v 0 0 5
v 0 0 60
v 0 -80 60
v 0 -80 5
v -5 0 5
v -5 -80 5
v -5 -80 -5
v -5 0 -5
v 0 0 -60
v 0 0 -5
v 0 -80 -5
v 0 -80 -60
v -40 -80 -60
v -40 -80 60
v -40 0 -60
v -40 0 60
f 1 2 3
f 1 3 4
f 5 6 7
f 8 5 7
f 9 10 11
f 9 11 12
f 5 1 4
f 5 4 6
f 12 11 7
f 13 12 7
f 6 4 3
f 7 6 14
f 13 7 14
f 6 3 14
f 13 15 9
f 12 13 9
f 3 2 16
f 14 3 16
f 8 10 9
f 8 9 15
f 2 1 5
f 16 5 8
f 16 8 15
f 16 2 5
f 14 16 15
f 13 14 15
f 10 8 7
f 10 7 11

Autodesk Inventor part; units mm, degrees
ref_plane "YZ Plane" through (0, 0, 0) normal (1, 0, 0) x (0, 1, 0)
ref_plane "XZ Plane" through (0, 0, 0) normal (0, 1, 0) x (-1, 0, 0)
ref_plane "XY Plane" through (0, 0, 0) normal (0, 0, 1) x (1, 0, 0)
sketch "Sketch1" plane through (0, 0, 0) normal (0, 1, 0) x (-1, 0, 0)
  line L0 (40, -60) -> (-40, -60)
  line L1 (-40, -60) -> (-40, 60)
  line L2 (-40, 60) -> (40, 60)
  line L3 (40, 60) -> (40, -60)
  line L4 (5, -5) -> (-5, -5)
  line L5 (-5, -5) -> (-5, 5)
  line L6 (-5, 5) -> (5, 5)
  line L7 (5, 5) -> (5, -5)
  point P0 (0, 0)
  point P1 (-5, 0)
  dimension "d1" = 120
  dimension "d2" = 80
  dimension "d3" = 10
  dimension "d4" = 10
  dimension "d5" = 5
  dimension "d6" = 5
  dimension "d7" = 40
  dimension "d8" = 60
extrude "Extrusion1" add sketch "Sketch1" against normal blind 80
sketch "Sketch5" plane through (40, 0, 60) normal (1, 0, 0) x (0, 0, -1)
  line L0 (120, 0) -> (0, 0) projected
  line L1 (120, 0) -> (120, -80) projected
  line L2 (120, -80) -> (0, -80) projected
  line L3 (0, 0) -> (0, -80) projected
  point P0 (60, 0)
extrude "Extrusion3" cut sketch "Sketch5" against normal blind 40
properties part number "socket_V2"
